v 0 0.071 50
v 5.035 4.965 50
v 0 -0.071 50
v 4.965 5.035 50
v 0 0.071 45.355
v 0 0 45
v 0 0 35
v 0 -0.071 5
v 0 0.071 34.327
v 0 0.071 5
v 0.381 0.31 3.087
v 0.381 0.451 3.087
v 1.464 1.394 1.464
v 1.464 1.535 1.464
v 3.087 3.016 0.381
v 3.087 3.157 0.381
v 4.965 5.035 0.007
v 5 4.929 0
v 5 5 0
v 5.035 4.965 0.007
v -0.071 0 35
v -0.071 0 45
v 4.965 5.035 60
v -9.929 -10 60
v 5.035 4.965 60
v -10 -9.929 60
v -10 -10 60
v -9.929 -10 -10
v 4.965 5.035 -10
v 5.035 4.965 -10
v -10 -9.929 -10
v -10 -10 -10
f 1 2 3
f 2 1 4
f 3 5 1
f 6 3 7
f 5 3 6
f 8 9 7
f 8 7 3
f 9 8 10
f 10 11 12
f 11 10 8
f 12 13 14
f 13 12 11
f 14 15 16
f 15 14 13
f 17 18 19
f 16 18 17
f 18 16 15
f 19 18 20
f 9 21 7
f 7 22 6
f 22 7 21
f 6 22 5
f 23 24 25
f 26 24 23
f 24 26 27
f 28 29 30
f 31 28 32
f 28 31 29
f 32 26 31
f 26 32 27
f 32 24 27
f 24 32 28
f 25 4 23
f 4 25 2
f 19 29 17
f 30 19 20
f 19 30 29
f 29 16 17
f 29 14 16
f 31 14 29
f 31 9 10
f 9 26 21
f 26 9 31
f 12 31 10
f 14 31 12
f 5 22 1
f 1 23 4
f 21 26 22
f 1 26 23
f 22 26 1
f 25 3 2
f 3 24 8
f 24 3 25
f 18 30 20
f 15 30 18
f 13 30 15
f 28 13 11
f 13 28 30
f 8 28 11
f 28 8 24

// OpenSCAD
// file: ../RoxySaty.scad
module mU (x, y, r) {
    translate([x,y,0])
    rotate(r)
    union() {
        difference() {
            circle(15); 
            circle(5);
            translate([-15,0,0]) square(30);
        };
        translate([-15,0,0]) square(10);
        translate([-10,10,0]) circle(5);
        translate([5,0,0]) square(10);
        translate([10,10,0]) circle(5);
    };
};

module mPata(x, y, r) {
    translate([x,y,0])
    rotate(r) {
        translate([-5,0,0]) square([10,20]);
        translate([0,0,0]) circle(5);
    }
}
    
module R() {
    union() {
        mU(15,15,180);
        mU(15,35,90);
        translate([0,5,0]) square([10,45]);
    };
};
    
module O() {
    union() {
        mU(15,15,0);
        mU(15,35,180);
    };
};

module X() {
    union() {
        mU(15,35,0);
        mU(15,15,180);
    };
};

module Y() {
    union() {
        mU(15,35,0);
        mPata(15,5,0);
    };
};

module S() {
    union() {
        difference() {
            mU(15,35,-90);
            translate([15,20,0]) square([15,10]);
        }   
        difference() {
            mU(15,15,90);
            translate([0,20,0]) square([15,10]);
        }
    }
}

module A() {
    union() {
        translate([15,35,0]) difference() {
            circle(15);
            circle(5);
        }
        mU(15,15,180);
        translate([0,15,0]) square([10, 20]);
        translate([20,15,0]) square([10, 20]);
    };
};    

module T () {
    union() {
        mPata(15,5,0);
        mPata(25,45,90);
        mPata(5,45,-90);
        translate([10,20,0]) square([10,20]);
    }
}

module Roxy() {
    R();
    translate([40,0,0]) O();
    translate([80,0,0]) X();
    translate([120,0,0]) Y();
}
module Saty() {
    S();
    translate([40,0,0]) A();
    translate([80,0,0]) T();
    translate([120,0,0]) Y();
}
// file: ../bloques.scad
use <RoxySaty.scad>

module RoxySaty() {
  union() {
    translate([  0, 165, 0]) rotate([90, 0,  0]) linear_extrude(180) Roxy();
    translate([165, 150, 0]) rotate([90, 0,-90]) linear_extrude(180) Saty();
  }
}

module RoxySatyNeg() {
  difference() {
    translate([75, 75, 25]) cube([170, 170, 70], true);
    RoxySaty();
  }
}
// main file
use <../bloques.scad>
$vpt = [ 75, 75, 25 ];
$vpr =  [ 90, 0, 45 ];
$vpd =  250;
$preview = false;
echo($preview); 
anchoPanel = sqrt(2) * 20;
coords = [for (x =[-5: 20: 155]) for (y=[-5: 20: 155]) [x, y, 25]];
l = len(coords);
// [
//   [-5, -5, 25],
//   [-5, 15, 25],
//   [-5, 35, 25],
//   [-5, 55, 25],
//   [-5, 75, 25],
//   [-5, 95, 25],
//   [-5, 115, 25],
//   [-5, 135, 25],
//   [-5, 155, 25],
//   [15, -5, 25],
//   [15, 15, 25],
//   [15, 35, 25],
//   [15, 55, 25],
//   [15, 75, 25],
//   [15, 95, 25],
//   [15, 115, 25],
//   [15, 135, 25],
//   [15, 155, 25],
//   [35, -5, 25],
//   [35, 15, 25],
//   [35, 35, 25],
//   [35, 55, 25],
//   [35, 75, 25],
//   [35, 95, 25],
//   [35, 115, 25],
//   [35, 135, 25],
//   [35, 155, 25],
//   [55, -5, 25],
//   [55, 15, 25],
//   [55, 35, 25],
//   [55, 55, 25],
//   [55, 75, 25],
//   [55, 95, 25],
//   [55, 115, 25],
//   [55, 135, 25],
//   [55, 155, 25],
//   [75, -5, 25],
//   [75, 15, 25],
//   [75, 35, 25],
//   [75, 55, 25],
//   [75, 75, 25],
//   [75, 95, 25],
//   [75, 115, 25],
//   [75, 135, 25],
//   [75, 155, 25],
//   [95, -5, 25],
//   [95, 15, 25],
//   [95, 35, 25],
//   [95, 55, 25],
//   [95, 75, 25],
//   [95, 95, 25],
//   [95, 115, 25],
//   [95, 135, 25],
//   [95, 155, 25],
//   [115, -5, 25],
//   [115, 15, 25],
//   [115, 35, 25],
//   [115, 55, 25],
//   [115, 75, 25],
//   [115, 95, 25],
//   [115, 115, 25],
//   [115, 135, 25],
//   [115, 155, 25],
//   [135, -5, 25],
//   [135, 15, 25],
//   [135, 35, 25],
//   [135, 55, 25],
//   [135, 75, 25],
//   [135, 95, 25],
//   [135, 115, 25],
//   [135, 135, 25],
//   [135, 155, 25],
//   [155, -5, 25],
//   [155, 15, 25],
//   [155, 35, 25],
//   [155, 55, 25],
//   [155, 75, 25],
//   [155, 95, 25],
//   [155, 115, 25],
//   [155, 135, 25],
//   [155, 155, 25]
//  ];

p = coords[floor($t * l)];
echo(t=$t, p=$preview, length=l, i=floor($t * l), coord=p );
color(p[0] == p[1] ? p[0] == 75 ? "yellow": "red": "blue"){
  intersection() {
    translate(coords[floor($t * l)]) rotate([0,0,45]) cube([anchoPanel, 0.1, 70], true);
    RoxySatyNeg();
  }
}
// intersection() {
//   translate([75,75,25]) rotate([0,0,45]) cube([170 * sqrt(2), 1, 70], true);
//   RoxySatyNeg();
// }
